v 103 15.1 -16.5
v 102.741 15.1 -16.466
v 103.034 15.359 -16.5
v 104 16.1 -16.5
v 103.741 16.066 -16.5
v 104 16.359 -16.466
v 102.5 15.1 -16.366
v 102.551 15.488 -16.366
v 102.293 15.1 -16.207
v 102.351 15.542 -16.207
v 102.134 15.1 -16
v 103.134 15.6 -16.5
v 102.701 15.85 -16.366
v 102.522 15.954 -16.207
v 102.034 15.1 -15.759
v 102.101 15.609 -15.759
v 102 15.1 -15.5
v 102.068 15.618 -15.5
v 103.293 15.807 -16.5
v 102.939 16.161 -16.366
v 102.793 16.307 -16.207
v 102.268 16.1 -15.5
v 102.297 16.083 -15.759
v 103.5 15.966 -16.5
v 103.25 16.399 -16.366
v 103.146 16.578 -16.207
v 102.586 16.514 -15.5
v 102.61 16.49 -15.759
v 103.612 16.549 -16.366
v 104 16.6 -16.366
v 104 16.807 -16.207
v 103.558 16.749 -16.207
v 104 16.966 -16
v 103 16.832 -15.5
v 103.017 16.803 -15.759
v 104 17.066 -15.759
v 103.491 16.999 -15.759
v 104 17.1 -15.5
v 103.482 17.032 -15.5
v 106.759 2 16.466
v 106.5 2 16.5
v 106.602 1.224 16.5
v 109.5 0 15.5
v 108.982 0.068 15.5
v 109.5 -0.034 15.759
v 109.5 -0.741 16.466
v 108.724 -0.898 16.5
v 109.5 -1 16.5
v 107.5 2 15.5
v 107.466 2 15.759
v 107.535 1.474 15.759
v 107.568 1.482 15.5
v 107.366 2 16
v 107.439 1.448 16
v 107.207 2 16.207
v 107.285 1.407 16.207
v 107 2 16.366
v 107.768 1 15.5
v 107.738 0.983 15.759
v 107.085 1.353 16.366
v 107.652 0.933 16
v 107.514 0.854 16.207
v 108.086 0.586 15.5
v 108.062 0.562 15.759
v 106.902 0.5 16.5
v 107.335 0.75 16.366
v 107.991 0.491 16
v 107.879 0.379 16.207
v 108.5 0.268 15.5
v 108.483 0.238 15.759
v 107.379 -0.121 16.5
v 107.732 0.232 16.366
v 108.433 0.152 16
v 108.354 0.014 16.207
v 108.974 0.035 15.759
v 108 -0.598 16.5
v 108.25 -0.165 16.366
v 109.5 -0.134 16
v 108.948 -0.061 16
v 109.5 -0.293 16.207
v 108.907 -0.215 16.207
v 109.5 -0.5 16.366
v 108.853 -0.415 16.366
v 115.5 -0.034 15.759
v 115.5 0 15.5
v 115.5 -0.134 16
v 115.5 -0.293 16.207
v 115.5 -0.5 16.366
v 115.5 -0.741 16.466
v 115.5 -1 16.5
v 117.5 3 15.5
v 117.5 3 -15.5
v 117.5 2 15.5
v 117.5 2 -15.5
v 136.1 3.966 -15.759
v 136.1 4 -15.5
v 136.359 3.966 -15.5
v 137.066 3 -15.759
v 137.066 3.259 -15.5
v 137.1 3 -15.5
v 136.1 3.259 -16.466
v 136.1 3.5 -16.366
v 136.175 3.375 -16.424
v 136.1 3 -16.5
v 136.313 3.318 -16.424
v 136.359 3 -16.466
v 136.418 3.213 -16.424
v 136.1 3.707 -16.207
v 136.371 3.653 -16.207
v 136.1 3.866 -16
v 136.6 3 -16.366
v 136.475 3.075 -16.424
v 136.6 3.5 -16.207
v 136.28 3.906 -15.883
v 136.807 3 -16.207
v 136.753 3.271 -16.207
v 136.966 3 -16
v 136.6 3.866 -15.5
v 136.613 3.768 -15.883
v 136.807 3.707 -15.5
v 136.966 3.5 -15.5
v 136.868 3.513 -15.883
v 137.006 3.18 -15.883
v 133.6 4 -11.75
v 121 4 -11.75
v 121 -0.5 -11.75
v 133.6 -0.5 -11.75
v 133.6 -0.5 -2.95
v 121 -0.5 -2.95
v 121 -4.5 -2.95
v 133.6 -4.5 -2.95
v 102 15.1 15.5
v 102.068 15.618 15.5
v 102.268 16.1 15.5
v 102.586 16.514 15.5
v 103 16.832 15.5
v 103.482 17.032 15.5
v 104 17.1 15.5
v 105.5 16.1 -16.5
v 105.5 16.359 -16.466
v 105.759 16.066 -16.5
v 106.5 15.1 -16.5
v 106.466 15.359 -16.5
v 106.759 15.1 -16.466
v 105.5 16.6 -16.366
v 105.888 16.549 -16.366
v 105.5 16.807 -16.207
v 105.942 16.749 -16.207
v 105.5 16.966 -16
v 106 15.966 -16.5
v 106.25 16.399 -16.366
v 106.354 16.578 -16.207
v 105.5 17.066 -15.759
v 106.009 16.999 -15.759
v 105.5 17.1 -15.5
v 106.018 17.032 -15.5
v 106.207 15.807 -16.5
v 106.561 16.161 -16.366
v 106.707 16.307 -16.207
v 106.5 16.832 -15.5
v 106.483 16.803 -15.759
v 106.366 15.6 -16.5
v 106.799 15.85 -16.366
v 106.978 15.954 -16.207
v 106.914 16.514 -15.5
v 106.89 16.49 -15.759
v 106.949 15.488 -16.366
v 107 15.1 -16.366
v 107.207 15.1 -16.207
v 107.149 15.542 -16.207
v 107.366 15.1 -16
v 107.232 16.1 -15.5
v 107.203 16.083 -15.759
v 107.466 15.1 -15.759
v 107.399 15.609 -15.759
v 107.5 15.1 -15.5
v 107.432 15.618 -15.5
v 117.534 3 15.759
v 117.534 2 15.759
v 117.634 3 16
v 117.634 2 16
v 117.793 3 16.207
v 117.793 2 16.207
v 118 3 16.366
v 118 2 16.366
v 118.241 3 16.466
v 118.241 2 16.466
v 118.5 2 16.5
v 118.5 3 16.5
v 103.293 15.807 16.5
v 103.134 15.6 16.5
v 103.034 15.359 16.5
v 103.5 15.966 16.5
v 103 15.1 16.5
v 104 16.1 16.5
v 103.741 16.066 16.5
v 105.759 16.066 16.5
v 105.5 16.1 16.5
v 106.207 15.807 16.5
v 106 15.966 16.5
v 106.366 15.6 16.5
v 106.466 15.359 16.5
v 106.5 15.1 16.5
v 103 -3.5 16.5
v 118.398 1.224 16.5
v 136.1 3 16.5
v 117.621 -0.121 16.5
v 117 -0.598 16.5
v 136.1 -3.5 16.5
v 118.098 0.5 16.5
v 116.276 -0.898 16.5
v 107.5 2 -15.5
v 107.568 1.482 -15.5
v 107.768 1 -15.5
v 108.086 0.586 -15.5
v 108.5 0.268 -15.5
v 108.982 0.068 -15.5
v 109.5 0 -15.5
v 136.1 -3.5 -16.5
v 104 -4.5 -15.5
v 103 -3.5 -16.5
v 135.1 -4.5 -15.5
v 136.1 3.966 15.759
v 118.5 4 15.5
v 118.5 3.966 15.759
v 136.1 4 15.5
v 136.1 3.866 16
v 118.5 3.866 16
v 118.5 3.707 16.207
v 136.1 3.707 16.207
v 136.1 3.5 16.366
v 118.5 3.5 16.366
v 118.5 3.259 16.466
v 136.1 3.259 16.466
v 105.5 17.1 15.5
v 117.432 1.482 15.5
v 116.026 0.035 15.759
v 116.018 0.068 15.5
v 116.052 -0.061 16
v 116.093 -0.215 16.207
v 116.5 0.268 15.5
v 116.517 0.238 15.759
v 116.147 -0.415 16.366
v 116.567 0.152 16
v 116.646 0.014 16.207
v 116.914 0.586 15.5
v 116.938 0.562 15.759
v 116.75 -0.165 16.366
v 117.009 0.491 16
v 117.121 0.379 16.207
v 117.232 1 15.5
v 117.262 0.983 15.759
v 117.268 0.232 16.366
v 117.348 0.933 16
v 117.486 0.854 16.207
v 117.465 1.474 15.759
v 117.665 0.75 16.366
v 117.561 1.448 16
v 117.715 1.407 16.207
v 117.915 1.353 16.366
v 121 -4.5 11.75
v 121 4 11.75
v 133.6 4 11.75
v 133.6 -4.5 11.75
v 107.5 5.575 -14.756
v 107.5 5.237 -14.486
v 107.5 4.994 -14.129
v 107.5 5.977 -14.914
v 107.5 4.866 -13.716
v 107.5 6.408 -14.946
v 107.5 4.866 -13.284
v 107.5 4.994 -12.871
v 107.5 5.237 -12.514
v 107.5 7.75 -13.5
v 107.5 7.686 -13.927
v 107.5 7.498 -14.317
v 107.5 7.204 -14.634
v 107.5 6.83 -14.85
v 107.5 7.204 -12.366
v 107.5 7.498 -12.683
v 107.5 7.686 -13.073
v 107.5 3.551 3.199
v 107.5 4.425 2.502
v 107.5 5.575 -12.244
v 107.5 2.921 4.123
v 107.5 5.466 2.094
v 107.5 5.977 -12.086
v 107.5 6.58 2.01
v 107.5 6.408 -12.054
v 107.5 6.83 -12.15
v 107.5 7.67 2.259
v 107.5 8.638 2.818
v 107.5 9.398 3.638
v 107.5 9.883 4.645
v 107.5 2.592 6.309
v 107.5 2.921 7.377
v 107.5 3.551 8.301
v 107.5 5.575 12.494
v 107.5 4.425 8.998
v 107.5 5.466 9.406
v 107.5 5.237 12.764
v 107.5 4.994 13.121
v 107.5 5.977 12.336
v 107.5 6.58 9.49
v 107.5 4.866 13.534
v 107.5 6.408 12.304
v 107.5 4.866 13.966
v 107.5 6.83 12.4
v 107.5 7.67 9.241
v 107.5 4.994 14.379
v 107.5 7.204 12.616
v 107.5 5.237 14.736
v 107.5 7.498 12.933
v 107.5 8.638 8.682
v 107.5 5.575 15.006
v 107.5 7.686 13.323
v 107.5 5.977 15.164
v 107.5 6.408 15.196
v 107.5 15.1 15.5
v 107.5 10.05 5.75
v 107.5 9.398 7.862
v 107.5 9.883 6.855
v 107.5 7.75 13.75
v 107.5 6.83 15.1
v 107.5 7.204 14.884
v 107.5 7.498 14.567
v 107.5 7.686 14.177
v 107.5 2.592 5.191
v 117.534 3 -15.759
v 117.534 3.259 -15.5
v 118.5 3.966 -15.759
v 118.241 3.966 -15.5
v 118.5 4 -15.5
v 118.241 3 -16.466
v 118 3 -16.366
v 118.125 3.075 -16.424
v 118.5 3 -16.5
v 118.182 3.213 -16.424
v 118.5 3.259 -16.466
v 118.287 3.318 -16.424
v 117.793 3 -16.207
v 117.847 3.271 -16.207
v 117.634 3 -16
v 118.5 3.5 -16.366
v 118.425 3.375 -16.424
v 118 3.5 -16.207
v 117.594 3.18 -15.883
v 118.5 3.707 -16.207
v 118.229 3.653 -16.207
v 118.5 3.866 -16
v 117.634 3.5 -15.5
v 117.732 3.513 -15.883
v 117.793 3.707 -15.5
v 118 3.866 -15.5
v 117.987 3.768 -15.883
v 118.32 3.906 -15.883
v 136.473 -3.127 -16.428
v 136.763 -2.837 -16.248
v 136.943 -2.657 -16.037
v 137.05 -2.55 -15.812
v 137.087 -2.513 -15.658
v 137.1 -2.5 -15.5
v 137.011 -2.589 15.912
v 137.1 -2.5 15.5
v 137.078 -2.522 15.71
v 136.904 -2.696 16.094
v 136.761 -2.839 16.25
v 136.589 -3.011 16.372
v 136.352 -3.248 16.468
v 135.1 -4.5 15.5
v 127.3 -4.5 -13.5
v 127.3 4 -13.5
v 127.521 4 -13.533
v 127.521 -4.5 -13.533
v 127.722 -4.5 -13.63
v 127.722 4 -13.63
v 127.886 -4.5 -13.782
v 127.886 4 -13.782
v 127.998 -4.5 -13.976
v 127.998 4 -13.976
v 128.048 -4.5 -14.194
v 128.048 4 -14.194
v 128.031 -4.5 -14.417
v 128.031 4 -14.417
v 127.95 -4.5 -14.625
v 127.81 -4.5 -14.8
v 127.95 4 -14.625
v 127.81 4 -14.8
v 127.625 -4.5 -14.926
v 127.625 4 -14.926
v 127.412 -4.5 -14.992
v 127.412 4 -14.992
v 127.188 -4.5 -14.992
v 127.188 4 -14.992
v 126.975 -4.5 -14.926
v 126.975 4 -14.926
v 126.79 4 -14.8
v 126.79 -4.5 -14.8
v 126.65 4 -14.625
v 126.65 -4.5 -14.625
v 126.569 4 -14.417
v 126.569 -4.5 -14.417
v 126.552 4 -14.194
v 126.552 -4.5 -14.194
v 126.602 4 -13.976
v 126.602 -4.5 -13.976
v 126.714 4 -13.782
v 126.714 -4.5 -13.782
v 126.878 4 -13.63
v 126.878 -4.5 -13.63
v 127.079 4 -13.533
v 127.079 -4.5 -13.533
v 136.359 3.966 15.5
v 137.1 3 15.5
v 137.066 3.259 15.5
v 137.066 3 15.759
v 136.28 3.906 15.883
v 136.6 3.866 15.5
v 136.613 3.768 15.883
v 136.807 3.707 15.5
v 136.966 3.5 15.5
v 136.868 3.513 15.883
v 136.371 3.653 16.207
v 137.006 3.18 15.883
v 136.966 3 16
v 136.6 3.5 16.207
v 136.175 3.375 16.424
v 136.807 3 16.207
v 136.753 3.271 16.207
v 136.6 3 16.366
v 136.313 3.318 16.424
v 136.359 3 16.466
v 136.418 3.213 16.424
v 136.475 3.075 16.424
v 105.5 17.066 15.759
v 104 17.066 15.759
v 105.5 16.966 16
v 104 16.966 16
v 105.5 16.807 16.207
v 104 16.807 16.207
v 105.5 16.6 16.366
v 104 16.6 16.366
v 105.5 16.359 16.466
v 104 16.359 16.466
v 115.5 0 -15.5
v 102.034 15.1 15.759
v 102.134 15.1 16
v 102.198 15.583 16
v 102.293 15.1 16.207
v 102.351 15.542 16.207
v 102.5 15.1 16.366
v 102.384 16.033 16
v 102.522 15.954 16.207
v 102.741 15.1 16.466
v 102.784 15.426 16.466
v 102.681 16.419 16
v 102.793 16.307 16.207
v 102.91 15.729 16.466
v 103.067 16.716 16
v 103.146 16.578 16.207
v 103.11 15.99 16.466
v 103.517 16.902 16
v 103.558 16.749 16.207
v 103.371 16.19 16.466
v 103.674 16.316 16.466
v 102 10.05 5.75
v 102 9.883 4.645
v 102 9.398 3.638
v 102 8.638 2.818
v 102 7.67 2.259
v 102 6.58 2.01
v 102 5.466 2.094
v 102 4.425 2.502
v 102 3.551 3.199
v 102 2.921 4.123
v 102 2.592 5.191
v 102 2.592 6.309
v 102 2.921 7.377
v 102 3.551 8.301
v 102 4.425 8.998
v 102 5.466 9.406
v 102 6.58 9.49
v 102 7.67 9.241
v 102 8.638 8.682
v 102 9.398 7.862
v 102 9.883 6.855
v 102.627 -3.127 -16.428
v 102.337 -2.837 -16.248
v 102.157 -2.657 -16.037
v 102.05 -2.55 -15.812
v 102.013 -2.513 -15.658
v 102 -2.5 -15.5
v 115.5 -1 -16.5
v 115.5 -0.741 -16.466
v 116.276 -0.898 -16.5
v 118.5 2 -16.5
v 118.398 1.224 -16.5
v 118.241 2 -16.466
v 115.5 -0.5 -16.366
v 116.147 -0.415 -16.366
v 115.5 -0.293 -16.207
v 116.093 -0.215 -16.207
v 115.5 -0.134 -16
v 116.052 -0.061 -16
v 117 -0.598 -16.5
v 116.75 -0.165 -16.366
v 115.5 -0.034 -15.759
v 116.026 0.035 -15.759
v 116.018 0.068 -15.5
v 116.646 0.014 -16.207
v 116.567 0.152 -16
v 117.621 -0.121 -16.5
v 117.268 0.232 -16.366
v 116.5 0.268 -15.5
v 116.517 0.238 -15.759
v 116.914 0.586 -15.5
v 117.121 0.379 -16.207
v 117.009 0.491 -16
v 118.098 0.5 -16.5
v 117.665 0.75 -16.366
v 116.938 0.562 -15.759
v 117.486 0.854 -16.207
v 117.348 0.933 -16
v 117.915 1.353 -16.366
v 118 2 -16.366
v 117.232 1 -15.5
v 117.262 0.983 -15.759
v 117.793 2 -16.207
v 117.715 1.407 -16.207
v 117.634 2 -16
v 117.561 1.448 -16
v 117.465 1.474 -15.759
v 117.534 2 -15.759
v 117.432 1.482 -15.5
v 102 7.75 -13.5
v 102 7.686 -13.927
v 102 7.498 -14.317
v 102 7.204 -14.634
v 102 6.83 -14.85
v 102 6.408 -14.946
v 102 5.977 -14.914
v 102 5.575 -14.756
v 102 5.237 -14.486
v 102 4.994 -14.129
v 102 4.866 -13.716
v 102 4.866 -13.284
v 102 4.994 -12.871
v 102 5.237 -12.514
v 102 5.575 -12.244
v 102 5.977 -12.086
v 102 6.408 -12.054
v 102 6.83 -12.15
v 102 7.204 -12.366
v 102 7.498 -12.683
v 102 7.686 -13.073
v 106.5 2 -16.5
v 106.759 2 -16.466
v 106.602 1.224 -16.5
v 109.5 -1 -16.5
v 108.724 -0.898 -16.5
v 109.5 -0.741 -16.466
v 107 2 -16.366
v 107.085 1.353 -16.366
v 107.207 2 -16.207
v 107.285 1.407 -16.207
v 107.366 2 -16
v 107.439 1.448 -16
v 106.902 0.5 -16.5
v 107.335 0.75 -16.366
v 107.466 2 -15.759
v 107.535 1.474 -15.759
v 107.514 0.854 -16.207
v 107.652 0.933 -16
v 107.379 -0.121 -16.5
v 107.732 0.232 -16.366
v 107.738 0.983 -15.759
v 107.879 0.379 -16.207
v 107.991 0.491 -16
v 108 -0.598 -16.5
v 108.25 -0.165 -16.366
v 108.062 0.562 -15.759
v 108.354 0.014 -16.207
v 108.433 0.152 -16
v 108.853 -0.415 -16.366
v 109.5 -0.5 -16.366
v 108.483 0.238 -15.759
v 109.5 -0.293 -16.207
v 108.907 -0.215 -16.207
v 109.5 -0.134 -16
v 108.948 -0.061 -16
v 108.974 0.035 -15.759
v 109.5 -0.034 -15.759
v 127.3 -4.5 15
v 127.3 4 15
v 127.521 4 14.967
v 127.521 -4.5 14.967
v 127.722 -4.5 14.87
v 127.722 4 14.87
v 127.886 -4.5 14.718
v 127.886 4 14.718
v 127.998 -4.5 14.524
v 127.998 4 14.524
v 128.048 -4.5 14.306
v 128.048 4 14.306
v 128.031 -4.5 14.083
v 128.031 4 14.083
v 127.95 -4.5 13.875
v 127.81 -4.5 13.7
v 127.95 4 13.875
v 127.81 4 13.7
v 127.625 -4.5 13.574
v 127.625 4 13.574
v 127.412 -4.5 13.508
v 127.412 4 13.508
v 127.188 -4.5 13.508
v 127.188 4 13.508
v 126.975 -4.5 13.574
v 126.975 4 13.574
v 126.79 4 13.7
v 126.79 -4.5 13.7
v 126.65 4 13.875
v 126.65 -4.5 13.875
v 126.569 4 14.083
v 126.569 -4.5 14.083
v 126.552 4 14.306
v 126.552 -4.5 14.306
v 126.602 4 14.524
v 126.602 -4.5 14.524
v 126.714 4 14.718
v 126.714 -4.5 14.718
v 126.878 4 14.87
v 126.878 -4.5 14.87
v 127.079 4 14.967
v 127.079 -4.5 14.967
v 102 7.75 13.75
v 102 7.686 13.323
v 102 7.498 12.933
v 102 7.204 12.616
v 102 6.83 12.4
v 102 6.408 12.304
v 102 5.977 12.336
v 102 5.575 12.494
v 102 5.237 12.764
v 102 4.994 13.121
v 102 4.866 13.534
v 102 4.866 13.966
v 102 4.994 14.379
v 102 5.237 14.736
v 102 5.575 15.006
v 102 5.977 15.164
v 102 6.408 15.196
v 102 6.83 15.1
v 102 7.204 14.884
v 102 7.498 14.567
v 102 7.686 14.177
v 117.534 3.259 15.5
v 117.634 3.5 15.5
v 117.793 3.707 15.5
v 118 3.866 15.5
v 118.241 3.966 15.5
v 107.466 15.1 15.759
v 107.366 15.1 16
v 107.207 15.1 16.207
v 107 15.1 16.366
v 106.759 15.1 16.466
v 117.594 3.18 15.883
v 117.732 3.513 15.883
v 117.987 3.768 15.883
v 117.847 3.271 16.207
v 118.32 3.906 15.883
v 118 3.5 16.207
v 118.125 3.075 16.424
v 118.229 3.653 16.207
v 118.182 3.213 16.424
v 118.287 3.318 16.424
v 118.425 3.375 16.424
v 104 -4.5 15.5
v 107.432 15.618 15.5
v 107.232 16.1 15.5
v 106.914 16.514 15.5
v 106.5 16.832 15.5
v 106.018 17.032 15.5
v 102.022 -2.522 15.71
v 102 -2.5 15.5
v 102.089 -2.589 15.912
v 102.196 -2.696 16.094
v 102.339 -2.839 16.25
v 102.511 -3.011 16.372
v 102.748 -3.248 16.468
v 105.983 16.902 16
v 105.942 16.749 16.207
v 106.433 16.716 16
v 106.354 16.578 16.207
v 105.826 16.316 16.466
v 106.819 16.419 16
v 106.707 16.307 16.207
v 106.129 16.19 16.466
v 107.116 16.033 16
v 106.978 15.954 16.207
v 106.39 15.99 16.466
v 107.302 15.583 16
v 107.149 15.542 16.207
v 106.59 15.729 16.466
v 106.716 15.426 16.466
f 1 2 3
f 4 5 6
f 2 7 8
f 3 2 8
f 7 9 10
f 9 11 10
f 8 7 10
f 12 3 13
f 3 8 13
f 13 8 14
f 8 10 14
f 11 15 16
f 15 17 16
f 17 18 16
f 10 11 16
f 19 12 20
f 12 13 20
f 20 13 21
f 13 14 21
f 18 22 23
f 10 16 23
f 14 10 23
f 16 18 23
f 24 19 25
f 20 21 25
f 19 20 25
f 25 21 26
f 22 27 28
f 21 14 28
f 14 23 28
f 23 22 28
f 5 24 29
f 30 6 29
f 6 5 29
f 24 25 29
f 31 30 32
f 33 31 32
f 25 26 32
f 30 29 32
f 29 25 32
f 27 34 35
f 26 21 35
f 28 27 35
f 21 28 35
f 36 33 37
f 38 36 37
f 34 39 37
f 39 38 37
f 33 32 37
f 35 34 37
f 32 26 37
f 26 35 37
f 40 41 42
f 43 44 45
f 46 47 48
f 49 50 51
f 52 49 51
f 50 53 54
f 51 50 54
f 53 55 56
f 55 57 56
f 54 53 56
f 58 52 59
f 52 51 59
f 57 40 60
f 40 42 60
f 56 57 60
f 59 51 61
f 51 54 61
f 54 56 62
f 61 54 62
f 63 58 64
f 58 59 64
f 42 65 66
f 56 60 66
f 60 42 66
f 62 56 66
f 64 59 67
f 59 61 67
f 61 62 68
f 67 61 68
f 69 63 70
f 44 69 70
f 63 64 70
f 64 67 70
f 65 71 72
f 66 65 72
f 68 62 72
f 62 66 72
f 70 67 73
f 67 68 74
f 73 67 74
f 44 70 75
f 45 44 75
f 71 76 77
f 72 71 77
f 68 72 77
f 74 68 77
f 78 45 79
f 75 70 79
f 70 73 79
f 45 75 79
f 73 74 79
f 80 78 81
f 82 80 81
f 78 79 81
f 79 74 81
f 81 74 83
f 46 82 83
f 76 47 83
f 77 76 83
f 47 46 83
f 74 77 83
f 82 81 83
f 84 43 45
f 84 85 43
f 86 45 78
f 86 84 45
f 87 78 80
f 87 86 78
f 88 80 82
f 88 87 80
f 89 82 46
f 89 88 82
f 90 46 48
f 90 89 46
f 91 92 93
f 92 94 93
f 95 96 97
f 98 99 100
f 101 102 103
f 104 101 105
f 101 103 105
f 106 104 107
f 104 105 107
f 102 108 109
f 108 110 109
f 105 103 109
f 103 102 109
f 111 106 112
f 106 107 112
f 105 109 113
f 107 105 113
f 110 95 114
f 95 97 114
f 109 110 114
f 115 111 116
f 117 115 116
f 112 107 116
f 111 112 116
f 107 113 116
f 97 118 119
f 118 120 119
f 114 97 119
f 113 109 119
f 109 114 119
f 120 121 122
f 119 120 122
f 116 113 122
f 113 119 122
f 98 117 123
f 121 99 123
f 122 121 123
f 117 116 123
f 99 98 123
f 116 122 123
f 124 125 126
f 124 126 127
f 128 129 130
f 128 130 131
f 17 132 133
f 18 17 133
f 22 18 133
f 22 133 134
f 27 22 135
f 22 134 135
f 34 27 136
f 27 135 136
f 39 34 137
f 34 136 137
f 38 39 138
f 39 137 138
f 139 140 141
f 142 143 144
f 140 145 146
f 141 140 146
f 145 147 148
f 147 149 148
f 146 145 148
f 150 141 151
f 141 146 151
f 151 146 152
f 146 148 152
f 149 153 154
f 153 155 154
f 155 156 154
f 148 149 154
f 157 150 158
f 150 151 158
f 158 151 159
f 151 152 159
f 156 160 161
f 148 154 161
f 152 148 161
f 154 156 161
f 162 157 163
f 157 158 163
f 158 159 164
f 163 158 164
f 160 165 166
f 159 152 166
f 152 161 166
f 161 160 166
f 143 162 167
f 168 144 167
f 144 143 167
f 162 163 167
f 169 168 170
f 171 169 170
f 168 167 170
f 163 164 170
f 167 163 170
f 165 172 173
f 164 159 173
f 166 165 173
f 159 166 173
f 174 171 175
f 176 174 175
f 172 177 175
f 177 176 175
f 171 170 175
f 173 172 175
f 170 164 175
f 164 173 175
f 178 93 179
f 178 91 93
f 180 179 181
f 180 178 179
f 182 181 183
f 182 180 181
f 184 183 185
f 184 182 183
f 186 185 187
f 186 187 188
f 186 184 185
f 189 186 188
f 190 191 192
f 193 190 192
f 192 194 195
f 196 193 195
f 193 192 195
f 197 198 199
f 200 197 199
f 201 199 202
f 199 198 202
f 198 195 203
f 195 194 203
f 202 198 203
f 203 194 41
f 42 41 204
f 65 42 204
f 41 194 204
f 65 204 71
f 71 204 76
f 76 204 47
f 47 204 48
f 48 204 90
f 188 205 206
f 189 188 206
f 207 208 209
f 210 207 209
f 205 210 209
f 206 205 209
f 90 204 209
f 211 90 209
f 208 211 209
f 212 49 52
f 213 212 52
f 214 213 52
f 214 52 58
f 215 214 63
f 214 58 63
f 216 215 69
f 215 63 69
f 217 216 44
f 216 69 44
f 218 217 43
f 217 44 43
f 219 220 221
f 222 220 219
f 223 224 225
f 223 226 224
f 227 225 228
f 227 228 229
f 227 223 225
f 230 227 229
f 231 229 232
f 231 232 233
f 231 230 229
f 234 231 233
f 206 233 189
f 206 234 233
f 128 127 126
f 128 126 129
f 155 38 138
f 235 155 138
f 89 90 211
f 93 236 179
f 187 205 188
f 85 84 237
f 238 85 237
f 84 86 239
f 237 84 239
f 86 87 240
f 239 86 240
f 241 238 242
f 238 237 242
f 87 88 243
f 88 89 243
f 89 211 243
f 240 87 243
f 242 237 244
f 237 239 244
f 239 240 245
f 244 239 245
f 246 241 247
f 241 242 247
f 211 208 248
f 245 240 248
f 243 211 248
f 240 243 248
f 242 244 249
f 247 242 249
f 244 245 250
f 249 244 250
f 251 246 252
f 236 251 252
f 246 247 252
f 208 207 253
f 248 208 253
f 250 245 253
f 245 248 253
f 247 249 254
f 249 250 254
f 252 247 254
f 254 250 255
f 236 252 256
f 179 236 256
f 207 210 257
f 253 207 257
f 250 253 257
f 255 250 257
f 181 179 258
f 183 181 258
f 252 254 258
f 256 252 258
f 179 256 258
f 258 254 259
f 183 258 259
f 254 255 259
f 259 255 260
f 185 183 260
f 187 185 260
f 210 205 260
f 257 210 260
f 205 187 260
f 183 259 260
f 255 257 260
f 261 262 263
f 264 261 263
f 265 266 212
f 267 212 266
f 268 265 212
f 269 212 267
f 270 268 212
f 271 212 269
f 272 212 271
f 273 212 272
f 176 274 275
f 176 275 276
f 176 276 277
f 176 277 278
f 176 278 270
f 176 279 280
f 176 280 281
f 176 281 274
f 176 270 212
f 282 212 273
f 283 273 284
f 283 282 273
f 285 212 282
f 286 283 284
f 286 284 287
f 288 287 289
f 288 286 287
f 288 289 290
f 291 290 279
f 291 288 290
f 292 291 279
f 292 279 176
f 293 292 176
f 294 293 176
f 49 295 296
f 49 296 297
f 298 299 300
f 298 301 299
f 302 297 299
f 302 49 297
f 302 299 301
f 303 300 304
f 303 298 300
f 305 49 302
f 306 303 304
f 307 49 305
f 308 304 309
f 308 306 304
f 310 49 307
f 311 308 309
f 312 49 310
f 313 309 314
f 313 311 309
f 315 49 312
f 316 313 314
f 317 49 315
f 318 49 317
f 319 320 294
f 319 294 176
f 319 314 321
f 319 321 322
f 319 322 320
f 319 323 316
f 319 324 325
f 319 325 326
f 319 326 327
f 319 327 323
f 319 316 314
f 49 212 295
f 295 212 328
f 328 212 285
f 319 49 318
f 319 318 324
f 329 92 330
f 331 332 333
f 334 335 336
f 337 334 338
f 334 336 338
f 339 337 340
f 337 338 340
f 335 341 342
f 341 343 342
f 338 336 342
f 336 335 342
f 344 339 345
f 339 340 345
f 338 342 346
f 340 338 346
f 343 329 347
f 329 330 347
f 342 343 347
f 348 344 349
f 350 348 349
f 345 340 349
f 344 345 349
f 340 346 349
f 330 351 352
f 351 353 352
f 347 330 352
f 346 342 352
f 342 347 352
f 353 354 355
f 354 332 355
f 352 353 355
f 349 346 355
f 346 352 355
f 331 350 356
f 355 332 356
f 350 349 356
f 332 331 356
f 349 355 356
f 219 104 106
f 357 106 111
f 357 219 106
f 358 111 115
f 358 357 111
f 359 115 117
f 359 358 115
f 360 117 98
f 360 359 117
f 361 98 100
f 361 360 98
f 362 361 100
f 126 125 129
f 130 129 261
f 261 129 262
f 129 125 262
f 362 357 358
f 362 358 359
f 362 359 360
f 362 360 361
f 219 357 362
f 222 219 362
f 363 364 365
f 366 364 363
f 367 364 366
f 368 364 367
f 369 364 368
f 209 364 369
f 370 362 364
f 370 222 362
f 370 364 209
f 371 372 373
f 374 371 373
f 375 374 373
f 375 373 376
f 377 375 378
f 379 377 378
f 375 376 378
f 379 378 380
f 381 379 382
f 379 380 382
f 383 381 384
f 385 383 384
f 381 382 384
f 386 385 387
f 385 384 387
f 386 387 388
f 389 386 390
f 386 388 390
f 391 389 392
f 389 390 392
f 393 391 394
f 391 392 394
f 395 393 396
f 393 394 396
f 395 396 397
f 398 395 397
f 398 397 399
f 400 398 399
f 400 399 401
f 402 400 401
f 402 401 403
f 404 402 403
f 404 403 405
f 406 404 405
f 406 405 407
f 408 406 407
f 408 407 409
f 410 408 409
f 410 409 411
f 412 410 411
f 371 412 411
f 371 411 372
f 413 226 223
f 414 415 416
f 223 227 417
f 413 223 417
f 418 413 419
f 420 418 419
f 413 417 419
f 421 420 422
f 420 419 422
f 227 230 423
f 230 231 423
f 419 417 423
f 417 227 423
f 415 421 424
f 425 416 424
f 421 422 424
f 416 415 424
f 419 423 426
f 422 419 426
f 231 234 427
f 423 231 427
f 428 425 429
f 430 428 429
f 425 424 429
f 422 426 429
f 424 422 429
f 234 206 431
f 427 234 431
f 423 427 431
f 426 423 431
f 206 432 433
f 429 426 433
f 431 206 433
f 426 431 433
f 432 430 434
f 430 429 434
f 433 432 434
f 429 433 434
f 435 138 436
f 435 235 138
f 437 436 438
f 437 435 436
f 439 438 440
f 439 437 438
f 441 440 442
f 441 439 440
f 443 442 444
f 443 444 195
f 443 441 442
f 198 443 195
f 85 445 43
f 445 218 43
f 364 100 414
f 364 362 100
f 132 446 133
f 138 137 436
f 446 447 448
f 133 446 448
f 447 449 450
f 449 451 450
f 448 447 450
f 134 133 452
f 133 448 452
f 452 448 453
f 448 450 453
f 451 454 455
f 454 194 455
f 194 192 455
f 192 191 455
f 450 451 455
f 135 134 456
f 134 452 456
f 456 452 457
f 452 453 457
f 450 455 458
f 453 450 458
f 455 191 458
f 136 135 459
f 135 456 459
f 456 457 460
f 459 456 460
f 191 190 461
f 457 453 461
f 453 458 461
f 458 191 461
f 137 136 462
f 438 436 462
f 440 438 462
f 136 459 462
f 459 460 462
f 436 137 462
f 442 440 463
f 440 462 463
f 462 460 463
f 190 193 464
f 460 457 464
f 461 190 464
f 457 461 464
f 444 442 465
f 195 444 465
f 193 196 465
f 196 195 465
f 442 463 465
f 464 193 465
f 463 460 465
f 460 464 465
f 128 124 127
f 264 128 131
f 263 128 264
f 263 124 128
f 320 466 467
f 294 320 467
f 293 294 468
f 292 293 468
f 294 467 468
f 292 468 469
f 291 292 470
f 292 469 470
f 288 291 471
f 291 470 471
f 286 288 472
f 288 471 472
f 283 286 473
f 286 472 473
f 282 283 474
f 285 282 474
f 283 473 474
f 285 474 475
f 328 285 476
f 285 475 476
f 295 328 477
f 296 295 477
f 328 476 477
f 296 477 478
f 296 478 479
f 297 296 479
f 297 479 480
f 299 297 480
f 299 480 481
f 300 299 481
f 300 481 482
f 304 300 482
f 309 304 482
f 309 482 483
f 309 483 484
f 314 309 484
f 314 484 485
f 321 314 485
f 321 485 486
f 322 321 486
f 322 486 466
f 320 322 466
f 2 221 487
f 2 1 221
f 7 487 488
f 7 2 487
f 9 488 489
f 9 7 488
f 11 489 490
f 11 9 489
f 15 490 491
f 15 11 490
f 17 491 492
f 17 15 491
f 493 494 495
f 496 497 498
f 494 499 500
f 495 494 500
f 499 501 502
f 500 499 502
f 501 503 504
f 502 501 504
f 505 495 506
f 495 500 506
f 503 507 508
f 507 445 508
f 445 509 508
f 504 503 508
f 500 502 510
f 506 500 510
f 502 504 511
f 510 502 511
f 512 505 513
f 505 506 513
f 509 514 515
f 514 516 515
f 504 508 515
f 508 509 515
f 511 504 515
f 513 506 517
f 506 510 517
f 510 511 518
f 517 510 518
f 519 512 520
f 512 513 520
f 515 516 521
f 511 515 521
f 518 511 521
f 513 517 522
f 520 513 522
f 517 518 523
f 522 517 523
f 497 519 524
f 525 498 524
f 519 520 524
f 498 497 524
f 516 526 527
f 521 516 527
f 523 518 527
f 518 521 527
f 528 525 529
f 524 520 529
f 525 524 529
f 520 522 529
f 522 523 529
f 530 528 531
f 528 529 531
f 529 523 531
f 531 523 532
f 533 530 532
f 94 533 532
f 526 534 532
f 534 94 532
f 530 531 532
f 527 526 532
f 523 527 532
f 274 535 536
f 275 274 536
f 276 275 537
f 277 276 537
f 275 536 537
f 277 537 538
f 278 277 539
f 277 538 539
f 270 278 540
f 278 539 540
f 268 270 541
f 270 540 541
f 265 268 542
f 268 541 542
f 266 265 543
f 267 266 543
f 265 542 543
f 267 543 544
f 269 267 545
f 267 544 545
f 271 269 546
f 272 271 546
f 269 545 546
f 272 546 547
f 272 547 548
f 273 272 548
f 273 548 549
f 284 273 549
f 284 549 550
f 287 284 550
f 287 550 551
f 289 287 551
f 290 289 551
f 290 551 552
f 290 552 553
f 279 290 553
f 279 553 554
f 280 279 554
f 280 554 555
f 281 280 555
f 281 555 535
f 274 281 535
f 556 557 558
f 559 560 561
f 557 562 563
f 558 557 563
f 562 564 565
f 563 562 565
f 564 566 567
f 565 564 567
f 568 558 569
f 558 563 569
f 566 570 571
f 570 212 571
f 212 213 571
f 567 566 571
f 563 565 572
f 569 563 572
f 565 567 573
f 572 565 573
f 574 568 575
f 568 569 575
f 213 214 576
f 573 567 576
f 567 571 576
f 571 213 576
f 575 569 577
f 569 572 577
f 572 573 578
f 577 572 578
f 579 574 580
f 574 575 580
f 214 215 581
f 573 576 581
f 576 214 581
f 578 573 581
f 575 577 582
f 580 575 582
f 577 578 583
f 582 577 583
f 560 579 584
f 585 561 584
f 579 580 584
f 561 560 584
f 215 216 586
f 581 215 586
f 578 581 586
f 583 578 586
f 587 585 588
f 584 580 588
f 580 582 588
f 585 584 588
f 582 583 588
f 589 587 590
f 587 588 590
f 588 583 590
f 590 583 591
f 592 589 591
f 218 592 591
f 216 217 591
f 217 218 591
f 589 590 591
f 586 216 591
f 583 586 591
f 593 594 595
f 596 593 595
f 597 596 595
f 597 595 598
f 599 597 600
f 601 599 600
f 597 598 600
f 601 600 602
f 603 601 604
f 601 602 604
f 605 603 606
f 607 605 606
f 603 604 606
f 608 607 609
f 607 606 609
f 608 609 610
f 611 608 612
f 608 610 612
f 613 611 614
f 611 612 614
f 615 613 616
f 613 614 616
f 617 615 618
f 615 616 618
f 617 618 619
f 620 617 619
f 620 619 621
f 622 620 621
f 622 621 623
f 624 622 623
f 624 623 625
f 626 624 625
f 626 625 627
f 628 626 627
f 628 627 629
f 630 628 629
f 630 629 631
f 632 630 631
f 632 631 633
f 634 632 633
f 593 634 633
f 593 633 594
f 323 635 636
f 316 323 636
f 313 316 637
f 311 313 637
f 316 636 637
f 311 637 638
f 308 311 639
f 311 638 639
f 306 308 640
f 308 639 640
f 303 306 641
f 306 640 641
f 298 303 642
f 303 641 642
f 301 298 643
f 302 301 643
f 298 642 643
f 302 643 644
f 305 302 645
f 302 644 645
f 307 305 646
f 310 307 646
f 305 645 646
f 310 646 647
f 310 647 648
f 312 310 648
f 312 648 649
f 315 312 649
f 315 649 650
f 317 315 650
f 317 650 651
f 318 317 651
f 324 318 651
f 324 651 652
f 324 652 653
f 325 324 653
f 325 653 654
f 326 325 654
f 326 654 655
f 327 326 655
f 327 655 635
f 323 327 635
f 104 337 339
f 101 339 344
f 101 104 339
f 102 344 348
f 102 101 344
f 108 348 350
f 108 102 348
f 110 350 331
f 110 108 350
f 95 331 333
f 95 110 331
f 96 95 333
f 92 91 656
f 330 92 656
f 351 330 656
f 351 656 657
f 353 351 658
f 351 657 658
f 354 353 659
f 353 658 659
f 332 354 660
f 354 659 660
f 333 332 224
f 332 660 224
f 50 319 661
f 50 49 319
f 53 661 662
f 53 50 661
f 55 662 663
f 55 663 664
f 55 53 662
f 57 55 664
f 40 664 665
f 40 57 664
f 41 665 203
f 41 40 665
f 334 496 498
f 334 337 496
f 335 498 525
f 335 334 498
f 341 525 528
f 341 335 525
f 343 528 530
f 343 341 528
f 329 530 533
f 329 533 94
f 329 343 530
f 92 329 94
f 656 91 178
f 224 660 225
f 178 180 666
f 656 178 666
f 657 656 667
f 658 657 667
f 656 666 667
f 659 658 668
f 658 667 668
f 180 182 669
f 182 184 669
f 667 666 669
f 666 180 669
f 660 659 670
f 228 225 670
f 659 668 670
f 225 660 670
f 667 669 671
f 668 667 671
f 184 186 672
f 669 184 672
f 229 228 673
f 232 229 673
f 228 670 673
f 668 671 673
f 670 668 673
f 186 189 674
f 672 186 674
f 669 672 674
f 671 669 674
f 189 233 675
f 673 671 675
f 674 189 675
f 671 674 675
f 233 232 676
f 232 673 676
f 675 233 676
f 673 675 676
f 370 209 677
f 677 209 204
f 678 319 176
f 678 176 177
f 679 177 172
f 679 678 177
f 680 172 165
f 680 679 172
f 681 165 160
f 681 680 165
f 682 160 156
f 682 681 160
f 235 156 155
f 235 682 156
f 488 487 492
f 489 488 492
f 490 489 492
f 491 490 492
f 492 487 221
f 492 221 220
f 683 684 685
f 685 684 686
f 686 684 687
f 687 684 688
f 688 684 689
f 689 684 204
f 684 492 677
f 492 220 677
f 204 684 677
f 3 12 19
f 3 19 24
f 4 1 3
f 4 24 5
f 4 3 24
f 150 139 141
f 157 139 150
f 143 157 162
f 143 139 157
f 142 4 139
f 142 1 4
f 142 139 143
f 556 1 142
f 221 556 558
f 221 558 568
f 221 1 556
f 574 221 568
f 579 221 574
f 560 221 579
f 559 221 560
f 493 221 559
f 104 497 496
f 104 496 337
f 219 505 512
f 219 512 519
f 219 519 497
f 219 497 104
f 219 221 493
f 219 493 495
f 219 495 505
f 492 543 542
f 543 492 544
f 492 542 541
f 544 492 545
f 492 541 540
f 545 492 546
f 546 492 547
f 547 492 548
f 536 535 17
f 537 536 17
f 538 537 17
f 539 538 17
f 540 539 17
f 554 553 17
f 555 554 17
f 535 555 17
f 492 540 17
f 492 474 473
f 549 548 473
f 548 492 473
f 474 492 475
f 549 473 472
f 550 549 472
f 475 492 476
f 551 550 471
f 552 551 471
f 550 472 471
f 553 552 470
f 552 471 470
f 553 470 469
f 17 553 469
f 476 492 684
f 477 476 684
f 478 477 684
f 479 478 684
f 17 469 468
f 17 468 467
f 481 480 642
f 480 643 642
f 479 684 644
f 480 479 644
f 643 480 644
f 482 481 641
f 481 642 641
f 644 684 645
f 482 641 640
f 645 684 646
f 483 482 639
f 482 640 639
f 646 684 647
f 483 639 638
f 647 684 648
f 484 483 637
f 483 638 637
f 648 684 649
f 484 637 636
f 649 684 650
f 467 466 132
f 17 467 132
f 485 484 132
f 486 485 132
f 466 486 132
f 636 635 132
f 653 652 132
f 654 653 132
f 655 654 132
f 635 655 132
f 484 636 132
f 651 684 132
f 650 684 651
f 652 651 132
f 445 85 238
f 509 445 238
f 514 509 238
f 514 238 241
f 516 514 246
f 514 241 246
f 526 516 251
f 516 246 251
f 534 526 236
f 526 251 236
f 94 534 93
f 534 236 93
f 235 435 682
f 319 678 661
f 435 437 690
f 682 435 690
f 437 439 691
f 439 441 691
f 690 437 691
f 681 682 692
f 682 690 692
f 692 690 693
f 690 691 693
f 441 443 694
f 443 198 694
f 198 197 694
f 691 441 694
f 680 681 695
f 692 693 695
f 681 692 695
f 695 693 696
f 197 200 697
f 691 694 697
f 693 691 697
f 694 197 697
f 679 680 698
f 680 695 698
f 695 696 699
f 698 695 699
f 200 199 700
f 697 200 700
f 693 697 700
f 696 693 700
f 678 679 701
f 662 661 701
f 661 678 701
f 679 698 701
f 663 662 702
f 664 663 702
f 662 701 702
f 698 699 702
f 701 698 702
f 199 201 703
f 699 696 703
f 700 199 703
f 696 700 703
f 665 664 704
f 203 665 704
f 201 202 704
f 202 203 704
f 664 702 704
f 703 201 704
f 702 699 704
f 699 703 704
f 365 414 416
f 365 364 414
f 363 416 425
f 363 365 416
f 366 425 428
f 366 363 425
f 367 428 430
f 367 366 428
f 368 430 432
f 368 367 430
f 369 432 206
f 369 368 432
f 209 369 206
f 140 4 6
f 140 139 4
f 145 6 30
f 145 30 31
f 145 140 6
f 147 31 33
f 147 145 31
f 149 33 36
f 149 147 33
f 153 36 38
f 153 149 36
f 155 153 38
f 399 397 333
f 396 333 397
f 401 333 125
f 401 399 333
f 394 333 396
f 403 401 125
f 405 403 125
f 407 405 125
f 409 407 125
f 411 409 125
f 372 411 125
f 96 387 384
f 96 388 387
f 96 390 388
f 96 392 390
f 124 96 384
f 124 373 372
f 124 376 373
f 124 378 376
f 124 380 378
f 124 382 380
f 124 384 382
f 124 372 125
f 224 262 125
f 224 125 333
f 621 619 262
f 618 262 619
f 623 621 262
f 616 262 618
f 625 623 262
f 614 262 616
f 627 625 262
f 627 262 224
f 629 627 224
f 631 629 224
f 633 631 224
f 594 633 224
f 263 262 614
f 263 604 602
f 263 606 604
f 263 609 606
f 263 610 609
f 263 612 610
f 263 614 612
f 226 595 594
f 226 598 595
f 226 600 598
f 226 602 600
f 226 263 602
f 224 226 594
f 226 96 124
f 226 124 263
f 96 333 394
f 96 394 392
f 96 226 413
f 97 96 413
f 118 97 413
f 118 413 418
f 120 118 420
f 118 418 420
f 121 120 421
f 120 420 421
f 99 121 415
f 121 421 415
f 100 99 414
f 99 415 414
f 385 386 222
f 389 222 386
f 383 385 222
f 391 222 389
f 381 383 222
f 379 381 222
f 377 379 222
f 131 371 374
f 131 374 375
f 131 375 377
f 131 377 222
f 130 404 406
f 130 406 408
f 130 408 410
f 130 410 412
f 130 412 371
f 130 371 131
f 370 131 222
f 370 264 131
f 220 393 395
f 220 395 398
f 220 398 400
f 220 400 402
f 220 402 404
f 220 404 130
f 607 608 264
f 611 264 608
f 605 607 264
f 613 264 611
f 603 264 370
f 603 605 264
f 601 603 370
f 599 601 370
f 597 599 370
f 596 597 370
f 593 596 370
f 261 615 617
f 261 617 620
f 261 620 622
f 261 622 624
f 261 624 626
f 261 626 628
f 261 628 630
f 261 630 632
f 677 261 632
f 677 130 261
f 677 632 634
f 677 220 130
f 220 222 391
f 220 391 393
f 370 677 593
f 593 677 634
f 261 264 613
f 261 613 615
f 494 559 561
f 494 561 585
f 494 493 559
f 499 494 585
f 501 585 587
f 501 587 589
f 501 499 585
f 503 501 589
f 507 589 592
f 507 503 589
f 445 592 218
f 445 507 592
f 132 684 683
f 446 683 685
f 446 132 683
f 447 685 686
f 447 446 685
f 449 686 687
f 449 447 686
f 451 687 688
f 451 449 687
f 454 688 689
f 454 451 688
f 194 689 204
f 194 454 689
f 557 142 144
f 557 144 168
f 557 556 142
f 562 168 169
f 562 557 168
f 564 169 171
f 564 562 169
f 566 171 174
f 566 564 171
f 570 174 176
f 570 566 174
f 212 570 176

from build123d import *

# Parameters (mm, degrees)
SKETCH048_W     = 21.6
SKETCH048_H     = 33
PAD018_DEPTH    = 5.5
SKETCH049_W     = 4.5
SKETCH049_H     = 33
PAD019_DEPTH    = 29.6
SKETCH050_W     = 33
SKETCH050_H     = 19.6
PAD020_DEPTH    = 4
SKETCH051_W     = 23.5
SKETCH051_H     = 12.6
POCKET023_DEPTH = 4.5
SKETCH052_W     = 14.7
SKETCH052_H     = 12.6
POCKET024_DEPTH = 4
SKETCH053_R     = 0.75
POCKET025_DEPTH = 9
CHAMFER007_SIZE = 1
CHAMFER008_SIZE = 2
FILLET010_R     = 2
FILLET013_R     = 2
FILLET014_R     = 2
FILLET015_R     = 1
FILLET016_R     = 1
SKETCH054_R     = 3.75
SKETCH054_R_2   = 1.45
POCKET026_DEPTH = 6


with BuildPart() as part:
    # Sketch048 → Pad018 (new body)
    with BuildSketch(Plane.YZ):
        with Locations((6.3, 0)):
            Rectangle(SKETCH048_W, SKETCH048_H)
    extrude(amount=PAD018_DEPTH)

    # Sketch049 (on Face6 of Pad018) → Pad019 (join)
    with BuildSketch(Plane.YZ.offset(5.5)):
        with Locations((-2.25, 0)):
            Rectangle(SKETCH049_W, SKETCH049_H)
    extrude(amount=PAD019_DEPTH)

    # Sketch050 (on Face9 of Pad019) → Pad020 (join)
    with BuildSketch(Plane.ZX):
        with Locations((0, 25.3)):
            Rectangle(SKETCH050_W, SKETCH050_H)
    extrude(amount=PAD020_DEPTH)

    # Sketch051 (on Face15 of Pad020) → Pocket023 (cut)
    with BuildSketch(Plane.ZX.offset(4)):
        with Locations((0, 25.3)):
            Rectangle(SKETCH051_W, SKETCH051_H)
    extrude(amount=-POCKET023_DEPTH, mode=Mode.SUBTRACT)

    # Sketch052 (on Face21 of Pocket023) → Pocket024 (cut)
    with BuildSketch(Plane.ZX.offset(-0.5)):
        with Locations((4.4, 25.3)):
            Rectangle(SKETCH052_W, SKETCH052_H)
    extrude(amount=-POCKET024_DEPTH, mode=Mode.SUBTRACT)

    # Sketch053 (on Face19 of Pocket024) → Pocket025 (cut)
    with BuildSketch(Plane.ZX.offset(4)):
        with Locations((-14.25, 25.3)):
            Circle(SKETCH053_R)
        with Locations((14.25, 25.3)):
            Circle(SKETCH053_R)
    extrude(amount=-POCKET025_DEPTH, mode=Mode.SUBTRACT)

    # Chamfer007
    chamfer007_edges = [part.edges().sort_by_distance(p)[0] for p in [
        (20.3, -4.5, 16.5),
        (20.3, -4.5, -16.5),
    ]]
    chamfer(chamfer007_edges, length=CHAMFER007_SIZE)

    # Chamfer008
    chamfer008_edges = [part.edges().sort_by_distance(p)[0] for p in [
        (0, -4.5, 0),
        (35.1, -4.5, 0),
    ]]
    chamfer(chamfer008_edges, length=CHAMFER008_SIZE)

    # Fillet010
    fillet010_edges = [part.edges().sort_by_distance(p)[0] for p in [
        (0, 17.1, 0),
        (5.5, 17.1, 0),
    ]]
    fillet(fillet010_edges, radius=FILLET010_R)

    # Fillet013
    fillet013_edges = [part.edges().sort_by_distance(p)[0] for p in [
        (5.5, 0, 0),
    ]]
    fillet(fillet013_edges, radius=FILLET013_R)

    # Fillet014
    fillet014_edges = [part.edges().sort_by_distance(p)[0] for p in [
        (15.5, 0, 0),
    ]]
    fillet(fillet014_edges, radius=FILLET014_R)

    # Fillet015
    fillet015_edges = [part.edges().sort_by_distance(p)[0] for p in [
        (15.5, 4, 0),
        (35.1, 4, 0),
    ]]
    fillet(fillet015_edges, radius=FILLET015_R)

    # Fillet016
    fillet016_edges = [part.edges().sort_by_distance(p)[0] for p in [
        (25.3, 4, 16.5),
        (25.3, 4, -16.5),
    ]]
    fillet(fillet016_edges, radius=FILLET016_R)

    # Sketch054 (on Face4 of Pocket025) → Pocket026 (cut)
    with BuildSketch(Plane(origin=(0, 0, 0), x_dir=(0, 1, 0), z_dir=(-1, 0, 0))):
        with Locations((6.3, -5.75)):
            Circle(SKETCH054_R)
        with Locations((6.3, -13.75)):
            Circle(SKETCH054_R_2)
        with Locations((6.3, 13.5)):
            Circle(SKETCH054_R_2)
    extrude(amount=-POCKET026_DEPTH, mode=Mode.SUBTRACT)


with BuildPart() as part_1:
    # Body005 placement: moved
    add(part.part.moved(Location((102, 0, 0))))


solid = part_1.part
